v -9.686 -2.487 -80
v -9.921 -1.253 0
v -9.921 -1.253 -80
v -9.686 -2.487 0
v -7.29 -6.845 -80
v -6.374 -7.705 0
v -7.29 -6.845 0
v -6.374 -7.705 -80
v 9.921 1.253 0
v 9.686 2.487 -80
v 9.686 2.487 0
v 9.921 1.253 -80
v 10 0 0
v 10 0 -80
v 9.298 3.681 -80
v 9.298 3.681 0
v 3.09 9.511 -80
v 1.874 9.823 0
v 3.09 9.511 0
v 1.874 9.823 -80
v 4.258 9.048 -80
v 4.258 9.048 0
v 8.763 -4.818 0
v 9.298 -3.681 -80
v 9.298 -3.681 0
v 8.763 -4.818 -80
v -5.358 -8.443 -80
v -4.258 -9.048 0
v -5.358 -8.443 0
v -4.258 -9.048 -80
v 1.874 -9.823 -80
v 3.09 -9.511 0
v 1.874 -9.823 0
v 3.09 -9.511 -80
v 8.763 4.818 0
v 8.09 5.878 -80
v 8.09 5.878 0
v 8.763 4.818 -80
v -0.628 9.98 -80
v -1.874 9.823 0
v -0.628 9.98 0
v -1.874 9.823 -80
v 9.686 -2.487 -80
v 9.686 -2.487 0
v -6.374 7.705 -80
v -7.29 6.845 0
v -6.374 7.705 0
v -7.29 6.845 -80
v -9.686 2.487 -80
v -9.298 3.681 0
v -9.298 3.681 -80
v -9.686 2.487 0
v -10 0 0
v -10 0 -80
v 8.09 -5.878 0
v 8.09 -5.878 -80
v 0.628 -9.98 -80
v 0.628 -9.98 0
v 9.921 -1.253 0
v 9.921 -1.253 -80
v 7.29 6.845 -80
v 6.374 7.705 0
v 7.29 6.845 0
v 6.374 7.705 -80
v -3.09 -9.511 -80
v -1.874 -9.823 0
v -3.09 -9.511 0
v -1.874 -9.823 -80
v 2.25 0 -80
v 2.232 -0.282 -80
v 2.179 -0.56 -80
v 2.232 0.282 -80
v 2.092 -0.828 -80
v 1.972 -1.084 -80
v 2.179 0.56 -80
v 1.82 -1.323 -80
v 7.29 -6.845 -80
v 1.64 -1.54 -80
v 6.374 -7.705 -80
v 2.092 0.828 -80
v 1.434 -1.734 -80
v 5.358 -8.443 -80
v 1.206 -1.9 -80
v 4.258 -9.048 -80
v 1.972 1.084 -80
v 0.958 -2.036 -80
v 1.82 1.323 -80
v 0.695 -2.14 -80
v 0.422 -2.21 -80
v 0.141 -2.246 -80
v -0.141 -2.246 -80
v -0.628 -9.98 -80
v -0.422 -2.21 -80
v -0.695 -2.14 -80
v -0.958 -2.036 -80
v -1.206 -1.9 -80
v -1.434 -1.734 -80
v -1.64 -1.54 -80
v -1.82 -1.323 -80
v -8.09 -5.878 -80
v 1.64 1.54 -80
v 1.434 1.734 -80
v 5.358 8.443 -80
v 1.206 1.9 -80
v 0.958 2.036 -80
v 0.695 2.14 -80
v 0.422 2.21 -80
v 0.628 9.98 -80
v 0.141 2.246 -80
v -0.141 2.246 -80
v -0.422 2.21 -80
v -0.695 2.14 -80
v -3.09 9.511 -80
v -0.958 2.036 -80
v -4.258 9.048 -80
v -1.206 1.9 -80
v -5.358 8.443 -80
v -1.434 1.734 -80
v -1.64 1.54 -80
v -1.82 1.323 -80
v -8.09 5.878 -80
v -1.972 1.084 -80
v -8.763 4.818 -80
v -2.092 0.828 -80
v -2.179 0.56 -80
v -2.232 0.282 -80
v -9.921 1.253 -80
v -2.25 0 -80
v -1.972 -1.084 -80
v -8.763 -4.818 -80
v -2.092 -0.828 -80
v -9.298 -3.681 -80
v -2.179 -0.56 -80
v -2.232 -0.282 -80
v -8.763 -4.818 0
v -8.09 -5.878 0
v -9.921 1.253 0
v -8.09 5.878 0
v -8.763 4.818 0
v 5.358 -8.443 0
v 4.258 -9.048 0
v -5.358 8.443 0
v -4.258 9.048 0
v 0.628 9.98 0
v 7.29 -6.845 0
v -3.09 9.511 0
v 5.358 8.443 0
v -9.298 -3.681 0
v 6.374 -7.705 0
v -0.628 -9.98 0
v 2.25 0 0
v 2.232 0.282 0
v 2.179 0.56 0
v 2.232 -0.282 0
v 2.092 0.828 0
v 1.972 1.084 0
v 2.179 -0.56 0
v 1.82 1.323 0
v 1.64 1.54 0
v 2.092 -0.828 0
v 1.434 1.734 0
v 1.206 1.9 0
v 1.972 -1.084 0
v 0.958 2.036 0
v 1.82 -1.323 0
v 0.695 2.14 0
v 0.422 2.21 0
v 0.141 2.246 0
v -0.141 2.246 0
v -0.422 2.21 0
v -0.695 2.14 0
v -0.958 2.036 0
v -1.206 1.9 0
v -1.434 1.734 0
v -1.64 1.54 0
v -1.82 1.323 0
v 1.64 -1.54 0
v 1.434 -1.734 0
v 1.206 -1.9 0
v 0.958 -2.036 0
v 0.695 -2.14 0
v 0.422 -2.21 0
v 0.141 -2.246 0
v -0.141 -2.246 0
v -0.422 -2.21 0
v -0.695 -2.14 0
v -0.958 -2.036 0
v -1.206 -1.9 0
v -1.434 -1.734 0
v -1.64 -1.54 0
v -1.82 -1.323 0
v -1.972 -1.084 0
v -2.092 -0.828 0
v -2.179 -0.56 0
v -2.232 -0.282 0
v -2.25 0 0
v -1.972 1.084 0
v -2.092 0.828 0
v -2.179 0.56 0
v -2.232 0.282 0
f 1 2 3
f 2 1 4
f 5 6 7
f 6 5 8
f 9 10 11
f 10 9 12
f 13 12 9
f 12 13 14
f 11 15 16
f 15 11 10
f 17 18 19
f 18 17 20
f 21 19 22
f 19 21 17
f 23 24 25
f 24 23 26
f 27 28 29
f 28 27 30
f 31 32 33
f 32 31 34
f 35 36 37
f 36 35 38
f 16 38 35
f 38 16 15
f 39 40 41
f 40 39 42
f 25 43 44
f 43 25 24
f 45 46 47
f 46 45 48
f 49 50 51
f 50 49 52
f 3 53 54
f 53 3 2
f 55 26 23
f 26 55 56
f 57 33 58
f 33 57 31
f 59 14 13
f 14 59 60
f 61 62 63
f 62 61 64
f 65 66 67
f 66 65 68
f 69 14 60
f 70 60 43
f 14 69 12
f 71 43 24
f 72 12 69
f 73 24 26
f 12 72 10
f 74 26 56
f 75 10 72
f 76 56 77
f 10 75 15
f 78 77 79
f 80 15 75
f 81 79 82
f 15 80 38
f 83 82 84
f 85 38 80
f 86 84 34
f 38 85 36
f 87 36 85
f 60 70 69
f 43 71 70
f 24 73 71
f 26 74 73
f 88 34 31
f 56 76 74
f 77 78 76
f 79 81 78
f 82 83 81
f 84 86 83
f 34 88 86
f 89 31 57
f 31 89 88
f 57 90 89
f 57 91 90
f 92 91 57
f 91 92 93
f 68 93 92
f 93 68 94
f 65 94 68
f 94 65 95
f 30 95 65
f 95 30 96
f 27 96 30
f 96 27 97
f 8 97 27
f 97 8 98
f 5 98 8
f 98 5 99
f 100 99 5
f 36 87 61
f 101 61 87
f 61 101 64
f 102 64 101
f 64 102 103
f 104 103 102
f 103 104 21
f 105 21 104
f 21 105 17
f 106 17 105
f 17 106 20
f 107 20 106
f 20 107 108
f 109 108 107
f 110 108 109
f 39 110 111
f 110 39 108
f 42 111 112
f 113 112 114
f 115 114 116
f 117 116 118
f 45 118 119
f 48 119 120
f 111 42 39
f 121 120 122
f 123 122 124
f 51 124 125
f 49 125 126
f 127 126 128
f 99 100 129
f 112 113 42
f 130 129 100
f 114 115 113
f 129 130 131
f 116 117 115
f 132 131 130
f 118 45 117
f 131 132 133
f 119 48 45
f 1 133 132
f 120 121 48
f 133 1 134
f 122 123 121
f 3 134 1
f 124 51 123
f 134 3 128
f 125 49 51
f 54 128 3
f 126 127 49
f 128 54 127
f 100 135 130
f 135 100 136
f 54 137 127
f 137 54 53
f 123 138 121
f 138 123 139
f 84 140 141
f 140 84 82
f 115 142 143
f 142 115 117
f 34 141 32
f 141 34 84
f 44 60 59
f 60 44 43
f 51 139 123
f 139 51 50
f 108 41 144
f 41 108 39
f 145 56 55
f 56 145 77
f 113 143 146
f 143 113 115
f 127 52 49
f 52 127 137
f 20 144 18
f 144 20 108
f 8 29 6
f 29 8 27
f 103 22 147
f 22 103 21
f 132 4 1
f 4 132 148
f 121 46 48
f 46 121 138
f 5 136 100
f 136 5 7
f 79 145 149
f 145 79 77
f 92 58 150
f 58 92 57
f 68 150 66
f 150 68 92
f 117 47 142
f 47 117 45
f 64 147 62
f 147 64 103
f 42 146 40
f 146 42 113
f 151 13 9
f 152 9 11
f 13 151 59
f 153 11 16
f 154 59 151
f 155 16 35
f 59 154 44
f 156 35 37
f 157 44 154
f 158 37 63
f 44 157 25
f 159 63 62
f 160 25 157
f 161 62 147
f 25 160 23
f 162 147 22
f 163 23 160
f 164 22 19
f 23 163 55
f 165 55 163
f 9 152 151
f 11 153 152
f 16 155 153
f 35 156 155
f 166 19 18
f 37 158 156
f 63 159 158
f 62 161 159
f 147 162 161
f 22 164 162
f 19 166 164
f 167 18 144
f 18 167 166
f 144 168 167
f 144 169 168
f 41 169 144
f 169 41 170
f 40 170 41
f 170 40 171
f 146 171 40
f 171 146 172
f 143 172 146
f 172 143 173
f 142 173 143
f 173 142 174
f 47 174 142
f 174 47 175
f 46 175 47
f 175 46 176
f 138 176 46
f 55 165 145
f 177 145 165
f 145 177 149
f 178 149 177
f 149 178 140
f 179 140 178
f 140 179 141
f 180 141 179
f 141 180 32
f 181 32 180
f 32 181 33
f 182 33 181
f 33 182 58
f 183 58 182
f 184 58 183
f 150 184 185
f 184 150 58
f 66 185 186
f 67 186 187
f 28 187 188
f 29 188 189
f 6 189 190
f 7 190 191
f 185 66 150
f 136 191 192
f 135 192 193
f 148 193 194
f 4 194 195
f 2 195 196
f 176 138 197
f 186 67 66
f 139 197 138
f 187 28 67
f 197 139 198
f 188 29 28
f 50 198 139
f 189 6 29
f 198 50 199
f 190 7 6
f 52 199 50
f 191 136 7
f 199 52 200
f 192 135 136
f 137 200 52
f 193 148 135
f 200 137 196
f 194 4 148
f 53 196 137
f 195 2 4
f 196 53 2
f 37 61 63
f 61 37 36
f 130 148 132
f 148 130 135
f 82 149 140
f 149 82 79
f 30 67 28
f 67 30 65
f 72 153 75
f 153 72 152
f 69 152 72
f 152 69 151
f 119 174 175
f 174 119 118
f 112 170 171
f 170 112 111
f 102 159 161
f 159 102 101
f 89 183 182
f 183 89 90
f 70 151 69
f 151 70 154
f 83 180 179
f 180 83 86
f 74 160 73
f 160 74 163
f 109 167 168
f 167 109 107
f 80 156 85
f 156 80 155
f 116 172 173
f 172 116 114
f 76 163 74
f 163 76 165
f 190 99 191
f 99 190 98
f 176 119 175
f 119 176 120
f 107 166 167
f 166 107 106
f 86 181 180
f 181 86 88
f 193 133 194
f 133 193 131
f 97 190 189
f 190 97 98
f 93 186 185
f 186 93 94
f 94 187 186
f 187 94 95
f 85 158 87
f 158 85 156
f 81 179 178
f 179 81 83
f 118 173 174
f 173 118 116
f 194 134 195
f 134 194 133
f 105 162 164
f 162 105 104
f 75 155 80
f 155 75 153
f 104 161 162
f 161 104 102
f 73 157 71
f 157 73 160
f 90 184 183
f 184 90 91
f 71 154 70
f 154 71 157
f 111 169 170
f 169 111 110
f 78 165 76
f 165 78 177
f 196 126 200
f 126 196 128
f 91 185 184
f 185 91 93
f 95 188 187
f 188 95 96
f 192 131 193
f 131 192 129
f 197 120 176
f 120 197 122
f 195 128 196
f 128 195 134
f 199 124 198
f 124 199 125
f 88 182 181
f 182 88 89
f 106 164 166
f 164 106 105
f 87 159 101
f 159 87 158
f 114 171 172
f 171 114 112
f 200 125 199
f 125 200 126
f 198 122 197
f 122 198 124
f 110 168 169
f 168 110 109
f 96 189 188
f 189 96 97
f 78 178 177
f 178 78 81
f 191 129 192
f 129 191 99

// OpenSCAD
$fn = 50;


difference() {
	union() {
		translate(v = [0, 0, -80.0000000000]) {
			cylinder(h = 80, r = 10.0000000000);
		}
		cylinder(h = 0, r = 19.0000000000);
	}
	union() {
		#translate(v = [0, 0, -80]) {
			cylinder(h = 80, r = 2.2500000000);
		}
	}
}
